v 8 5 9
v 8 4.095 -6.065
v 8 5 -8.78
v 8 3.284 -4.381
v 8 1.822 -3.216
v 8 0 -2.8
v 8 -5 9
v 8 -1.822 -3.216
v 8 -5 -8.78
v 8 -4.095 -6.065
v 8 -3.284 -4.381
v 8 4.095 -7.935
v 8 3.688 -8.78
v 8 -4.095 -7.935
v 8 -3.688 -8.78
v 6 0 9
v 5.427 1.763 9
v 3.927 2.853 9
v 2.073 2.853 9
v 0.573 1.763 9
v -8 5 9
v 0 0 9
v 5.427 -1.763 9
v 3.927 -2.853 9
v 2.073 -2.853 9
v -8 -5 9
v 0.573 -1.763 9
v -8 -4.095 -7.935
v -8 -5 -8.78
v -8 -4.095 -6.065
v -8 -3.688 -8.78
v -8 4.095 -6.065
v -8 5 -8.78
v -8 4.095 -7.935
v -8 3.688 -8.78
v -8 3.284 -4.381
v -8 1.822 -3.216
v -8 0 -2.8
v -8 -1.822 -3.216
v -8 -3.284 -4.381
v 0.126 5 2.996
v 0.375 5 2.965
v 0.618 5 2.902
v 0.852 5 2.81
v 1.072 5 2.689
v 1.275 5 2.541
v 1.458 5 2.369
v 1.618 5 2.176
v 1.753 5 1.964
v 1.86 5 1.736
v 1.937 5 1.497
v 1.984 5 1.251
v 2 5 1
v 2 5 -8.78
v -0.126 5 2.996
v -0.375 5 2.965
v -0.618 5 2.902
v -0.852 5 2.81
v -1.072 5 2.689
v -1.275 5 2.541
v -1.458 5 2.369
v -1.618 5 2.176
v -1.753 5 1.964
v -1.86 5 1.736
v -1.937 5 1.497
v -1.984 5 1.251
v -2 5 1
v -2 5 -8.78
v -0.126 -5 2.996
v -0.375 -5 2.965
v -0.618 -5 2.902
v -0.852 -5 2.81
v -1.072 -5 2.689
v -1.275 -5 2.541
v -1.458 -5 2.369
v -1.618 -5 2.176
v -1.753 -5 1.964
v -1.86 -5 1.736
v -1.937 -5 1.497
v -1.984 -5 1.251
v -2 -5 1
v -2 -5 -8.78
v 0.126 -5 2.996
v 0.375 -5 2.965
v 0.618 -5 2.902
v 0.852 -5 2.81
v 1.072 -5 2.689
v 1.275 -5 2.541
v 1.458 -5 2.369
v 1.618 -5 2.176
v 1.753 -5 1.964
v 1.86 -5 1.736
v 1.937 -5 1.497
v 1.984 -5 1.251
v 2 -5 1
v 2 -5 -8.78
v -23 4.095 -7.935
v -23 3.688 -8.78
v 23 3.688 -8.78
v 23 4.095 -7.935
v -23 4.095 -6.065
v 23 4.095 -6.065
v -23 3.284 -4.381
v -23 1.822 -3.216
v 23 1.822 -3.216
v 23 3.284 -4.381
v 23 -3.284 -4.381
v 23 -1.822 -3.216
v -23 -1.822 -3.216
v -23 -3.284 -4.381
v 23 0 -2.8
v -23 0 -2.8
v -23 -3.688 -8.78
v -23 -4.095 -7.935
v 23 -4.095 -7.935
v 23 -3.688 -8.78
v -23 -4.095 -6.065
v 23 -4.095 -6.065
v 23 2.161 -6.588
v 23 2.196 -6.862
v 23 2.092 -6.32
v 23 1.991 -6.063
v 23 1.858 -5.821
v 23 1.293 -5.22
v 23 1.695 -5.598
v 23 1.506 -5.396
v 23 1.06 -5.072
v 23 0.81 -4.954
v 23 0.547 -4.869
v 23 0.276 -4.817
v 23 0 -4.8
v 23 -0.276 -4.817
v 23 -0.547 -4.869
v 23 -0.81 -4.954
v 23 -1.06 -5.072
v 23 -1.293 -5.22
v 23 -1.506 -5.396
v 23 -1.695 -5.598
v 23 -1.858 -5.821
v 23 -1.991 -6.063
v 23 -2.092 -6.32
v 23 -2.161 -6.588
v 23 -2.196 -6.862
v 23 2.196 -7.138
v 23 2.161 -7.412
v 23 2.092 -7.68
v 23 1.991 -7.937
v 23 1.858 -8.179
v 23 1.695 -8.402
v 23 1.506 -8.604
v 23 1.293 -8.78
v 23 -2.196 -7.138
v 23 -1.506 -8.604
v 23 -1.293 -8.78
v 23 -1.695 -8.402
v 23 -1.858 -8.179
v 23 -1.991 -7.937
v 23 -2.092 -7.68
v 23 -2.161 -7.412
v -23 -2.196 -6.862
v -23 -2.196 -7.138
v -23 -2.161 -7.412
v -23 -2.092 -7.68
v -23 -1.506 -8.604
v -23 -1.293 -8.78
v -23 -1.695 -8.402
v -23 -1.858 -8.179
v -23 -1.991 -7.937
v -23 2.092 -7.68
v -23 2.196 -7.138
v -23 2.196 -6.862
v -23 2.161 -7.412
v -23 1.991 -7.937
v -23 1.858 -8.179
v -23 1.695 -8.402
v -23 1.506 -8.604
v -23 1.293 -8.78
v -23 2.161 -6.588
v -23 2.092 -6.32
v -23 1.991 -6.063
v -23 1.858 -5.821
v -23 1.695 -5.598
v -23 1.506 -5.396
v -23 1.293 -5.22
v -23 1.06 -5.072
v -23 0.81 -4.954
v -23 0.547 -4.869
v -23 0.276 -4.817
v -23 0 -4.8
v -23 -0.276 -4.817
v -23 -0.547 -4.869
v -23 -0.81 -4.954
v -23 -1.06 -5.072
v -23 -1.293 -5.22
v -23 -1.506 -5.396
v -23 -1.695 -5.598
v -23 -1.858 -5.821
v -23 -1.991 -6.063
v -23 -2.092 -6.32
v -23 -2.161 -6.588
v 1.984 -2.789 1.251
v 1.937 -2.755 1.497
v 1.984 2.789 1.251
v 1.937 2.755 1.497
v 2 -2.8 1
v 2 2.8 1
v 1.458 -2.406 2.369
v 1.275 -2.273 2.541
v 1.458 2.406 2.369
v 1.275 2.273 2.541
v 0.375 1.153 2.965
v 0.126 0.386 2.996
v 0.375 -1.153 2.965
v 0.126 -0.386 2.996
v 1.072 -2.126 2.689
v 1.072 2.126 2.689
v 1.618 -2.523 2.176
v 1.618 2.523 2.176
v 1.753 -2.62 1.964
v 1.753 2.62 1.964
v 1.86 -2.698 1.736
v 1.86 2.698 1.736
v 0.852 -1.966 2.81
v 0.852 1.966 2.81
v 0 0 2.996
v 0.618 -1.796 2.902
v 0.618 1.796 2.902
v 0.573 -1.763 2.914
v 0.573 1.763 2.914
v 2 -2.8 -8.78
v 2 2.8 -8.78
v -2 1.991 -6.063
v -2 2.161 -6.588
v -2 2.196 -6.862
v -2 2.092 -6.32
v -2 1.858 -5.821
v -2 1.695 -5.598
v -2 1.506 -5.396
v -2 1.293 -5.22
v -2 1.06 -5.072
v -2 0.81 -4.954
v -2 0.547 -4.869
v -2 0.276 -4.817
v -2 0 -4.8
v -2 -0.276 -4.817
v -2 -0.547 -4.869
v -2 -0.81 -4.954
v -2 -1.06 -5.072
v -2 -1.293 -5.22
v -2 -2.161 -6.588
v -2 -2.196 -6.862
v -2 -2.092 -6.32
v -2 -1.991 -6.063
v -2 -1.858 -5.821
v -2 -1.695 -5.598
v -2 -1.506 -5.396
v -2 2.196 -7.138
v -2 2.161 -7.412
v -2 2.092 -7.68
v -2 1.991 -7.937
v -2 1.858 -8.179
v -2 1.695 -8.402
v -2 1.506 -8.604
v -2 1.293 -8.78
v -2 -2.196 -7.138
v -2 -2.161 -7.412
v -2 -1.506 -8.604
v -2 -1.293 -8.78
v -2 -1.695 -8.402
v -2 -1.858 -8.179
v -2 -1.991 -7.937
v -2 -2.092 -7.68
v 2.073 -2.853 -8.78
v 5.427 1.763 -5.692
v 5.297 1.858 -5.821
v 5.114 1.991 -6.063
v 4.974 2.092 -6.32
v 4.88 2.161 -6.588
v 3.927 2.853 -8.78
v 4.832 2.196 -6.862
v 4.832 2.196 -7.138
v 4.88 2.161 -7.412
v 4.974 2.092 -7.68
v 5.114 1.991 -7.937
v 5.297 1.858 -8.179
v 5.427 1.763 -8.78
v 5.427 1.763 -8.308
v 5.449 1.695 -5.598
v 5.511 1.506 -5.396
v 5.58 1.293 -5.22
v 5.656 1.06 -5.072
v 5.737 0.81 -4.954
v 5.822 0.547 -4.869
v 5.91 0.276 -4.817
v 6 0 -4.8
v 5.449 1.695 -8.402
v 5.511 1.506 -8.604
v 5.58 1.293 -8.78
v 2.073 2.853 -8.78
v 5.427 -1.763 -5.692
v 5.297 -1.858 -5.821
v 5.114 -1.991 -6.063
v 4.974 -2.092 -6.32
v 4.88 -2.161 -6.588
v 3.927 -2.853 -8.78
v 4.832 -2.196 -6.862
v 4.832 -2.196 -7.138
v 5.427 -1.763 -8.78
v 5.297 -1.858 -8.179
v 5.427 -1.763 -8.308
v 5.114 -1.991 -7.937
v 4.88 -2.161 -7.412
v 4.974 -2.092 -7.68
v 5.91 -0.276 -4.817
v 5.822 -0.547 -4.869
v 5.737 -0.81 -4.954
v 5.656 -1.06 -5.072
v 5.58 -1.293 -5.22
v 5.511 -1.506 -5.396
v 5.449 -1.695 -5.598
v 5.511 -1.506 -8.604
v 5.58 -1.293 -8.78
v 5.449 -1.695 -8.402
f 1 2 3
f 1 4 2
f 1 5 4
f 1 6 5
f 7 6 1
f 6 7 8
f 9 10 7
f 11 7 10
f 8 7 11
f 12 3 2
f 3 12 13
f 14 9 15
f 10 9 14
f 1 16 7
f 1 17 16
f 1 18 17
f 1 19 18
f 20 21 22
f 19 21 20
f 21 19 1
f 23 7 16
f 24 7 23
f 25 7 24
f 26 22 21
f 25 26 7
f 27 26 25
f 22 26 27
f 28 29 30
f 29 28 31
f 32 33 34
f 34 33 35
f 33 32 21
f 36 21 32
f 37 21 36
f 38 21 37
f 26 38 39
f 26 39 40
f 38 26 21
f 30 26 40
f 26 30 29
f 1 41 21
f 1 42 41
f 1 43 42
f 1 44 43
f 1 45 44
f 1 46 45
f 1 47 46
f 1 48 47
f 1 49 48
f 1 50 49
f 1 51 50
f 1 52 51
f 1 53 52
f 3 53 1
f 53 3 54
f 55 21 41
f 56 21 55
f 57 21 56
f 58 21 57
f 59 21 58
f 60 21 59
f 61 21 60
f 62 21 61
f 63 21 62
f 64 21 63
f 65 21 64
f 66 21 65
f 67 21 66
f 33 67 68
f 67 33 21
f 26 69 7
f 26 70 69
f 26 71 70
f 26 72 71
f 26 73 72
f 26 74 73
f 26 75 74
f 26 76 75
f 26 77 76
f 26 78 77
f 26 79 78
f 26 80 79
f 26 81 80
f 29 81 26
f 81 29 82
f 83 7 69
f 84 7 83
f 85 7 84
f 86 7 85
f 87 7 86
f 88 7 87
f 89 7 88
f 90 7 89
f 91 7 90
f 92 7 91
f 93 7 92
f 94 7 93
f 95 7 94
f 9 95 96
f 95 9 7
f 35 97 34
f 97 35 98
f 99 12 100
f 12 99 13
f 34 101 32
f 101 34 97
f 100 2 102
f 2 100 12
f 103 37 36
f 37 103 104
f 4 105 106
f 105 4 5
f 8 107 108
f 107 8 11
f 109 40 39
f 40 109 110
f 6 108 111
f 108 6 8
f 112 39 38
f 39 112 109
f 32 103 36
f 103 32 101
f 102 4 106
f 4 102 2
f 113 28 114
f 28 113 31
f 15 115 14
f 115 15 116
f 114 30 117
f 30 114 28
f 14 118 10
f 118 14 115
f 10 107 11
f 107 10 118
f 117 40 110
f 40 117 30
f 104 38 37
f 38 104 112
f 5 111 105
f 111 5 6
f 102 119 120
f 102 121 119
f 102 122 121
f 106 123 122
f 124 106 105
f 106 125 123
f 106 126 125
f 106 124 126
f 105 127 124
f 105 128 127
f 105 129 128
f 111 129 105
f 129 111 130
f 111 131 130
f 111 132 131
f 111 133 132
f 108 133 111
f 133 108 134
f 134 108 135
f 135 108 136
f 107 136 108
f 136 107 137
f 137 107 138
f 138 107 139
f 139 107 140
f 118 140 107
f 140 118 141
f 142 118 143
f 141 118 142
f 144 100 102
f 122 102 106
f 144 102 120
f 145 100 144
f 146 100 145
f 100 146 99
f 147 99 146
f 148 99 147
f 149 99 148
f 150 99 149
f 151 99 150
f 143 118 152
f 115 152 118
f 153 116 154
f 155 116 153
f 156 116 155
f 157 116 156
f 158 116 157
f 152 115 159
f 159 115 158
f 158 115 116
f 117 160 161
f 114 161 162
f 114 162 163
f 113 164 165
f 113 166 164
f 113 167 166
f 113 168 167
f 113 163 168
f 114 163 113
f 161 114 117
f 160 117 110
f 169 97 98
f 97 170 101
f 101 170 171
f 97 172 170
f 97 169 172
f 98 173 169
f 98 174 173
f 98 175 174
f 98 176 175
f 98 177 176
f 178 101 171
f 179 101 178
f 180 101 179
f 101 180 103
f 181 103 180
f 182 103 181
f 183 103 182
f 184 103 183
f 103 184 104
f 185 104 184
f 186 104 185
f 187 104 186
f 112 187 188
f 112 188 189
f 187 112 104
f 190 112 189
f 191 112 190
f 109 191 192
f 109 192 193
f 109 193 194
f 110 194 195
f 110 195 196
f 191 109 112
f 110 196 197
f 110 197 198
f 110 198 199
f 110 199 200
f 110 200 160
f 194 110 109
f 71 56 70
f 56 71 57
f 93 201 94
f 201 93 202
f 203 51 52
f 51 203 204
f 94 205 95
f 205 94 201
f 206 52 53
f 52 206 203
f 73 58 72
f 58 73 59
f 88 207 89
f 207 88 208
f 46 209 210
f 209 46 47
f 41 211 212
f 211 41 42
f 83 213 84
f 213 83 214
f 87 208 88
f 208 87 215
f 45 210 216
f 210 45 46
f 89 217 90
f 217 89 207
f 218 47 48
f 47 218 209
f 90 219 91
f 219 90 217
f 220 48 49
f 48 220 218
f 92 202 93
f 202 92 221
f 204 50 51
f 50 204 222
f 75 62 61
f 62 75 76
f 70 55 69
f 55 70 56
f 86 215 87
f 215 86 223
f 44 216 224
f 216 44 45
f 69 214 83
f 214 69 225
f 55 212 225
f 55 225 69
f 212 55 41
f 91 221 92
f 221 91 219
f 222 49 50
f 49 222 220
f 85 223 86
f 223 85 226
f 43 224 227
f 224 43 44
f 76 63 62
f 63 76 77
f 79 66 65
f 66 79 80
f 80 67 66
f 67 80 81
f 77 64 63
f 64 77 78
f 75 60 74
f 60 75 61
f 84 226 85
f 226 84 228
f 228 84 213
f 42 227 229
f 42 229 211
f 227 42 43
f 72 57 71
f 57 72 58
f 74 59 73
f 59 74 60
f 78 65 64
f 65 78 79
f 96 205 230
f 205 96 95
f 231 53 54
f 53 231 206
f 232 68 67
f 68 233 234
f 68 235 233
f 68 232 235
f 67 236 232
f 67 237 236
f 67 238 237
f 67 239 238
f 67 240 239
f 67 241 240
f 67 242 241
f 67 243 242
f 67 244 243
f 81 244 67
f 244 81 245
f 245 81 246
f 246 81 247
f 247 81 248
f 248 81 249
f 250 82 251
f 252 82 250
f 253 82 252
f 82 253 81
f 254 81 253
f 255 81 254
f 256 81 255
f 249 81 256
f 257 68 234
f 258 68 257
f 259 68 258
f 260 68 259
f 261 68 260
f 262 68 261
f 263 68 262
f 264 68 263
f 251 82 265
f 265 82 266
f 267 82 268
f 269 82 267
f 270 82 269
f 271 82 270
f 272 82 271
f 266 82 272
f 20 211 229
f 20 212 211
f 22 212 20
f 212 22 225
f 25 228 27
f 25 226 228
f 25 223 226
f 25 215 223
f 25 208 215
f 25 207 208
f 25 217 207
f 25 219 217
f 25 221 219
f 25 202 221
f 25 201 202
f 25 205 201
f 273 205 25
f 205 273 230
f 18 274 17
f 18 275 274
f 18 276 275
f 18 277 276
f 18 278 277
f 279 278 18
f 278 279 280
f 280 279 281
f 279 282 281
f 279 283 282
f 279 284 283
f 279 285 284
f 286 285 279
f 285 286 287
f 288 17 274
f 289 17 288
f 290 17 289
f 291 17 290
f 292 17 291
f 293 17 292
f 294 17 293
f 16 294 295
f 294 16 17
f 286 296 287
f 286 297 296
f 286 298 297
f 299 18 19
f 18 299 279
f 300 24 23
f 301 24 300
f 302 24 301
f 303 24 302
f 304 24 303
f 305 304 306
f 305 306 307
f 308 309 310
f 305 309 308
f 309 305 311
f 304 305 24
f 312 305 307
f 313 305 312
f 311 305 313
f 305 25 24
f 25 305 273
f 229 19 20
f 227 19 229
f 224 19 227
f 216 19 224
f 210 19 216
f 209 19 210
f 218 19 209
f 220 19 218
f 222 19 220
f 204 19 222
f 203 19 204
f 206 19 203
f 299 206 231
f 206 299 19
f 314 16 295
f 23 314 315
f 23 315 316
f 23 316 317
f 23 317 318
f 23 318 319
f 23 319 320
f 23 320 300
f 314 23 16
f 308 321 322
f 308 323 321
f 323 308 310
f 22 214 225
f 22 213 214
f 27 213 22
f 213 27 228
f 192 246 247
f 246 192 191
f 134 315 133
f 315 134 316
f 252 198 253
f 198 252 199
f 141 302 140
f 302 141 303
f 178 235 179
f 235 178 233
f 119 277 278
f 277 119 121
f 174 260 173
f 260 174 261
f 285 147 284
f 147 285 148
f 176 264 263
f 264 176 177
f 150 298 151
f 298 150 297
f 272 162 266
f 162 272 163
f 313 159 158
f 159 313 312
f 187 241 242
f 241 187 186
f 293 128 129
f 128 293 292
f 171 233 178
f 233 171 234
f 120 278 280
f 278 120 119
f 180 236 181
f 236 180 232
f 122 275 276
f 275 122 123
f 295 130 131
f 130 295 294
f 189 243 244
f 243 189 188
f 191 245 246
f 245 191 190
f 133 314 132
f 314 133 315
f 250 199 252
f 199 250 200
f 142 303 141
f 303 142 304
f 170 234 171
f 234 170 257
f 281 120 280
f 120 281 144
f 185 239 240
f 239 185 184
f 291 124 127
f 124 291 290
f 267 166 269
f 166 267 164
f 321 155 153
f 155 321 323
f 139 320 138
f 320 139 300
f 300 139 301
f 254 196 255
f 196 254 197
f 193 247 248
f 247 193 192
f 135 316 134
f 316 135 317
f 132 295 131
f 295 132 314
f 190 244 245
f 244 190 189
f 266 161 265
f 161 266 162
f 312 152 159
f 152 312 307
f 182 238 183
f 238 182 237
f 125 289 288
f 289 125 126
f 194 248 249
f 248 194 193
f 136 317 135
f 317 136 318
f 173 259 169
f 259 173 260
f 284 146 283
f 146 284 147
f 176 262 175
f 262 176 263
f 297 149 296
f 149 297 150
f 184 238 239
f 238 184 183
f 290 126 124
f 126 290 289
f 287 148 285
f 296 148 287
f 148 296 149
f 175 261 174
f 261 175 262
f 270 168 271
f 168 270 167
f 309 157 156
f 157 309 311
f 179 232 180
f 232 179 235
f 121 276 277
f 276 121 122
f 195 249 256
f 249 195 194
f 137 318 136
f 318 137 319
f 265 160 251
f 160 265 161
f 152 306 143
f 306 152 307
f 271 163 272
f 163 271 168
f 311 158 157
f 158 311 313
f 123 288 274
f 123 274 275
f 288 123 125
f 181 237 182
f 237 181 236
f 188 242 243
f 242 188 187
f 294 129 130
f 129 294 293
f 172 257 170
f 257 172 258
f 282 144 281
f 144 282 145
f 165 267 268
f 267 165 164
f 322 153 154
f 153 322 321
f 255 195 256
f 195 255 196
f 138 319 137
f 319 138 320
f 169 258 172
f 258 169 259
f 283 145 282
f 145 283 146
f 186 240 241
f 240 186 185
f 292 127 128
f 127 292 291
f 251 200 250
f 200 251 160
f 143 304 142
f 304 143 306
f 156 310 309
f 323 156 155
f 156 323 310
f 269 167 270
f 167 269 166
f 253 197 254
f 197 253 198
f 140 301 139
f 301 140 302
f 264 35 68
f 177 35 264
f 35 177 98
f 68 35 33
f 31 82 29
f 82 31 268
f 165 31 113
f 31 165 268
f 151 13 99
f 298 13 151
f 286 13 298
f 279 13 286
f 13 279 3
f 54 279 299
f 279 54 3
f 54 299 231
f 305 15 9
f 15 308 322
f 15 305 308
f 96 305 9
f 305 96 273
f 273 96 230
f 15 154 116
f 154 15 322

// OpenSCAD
rotate([0, 0, 0]) {
difference() {
	
	union() {

		cube(size=[16, 10, 18], center=true);
//		cylinder(r=10, h=18, center=true);
	
		translate([0, 0, -7]) {
			rotate([0, 90, 0]) {
				cylinder(r=4.2, h=46, center=true);			
			}			
		}
		

	}

	translate([3, 0, 0]) {
		cylinder(r=3, h=22, center=true);		
	}

	translate([0, 0, -9]) {
		translate([0, 0, 10]) {
			rotate([90,0, 0]) {
				cylinder(r=2, h=25, center=true, $fn = 50);			
			}					
		}
		cube(size=[4, 22, 20], center=true);		
	}


	translate([0, 0, -11]) {
		translate([0, 0, 4]) {
			rotate([0,90, 0]) {
				cylinder(r=2.2, h=60, center=true, $fn = 50);			
			}					
		}
//		cube(size=[60, 4, 8], center=true);			
	}

	translate([0, 0, -11.28]) {
		cube(size=[90, 90, 5], center=true);		
	}

}	
}
